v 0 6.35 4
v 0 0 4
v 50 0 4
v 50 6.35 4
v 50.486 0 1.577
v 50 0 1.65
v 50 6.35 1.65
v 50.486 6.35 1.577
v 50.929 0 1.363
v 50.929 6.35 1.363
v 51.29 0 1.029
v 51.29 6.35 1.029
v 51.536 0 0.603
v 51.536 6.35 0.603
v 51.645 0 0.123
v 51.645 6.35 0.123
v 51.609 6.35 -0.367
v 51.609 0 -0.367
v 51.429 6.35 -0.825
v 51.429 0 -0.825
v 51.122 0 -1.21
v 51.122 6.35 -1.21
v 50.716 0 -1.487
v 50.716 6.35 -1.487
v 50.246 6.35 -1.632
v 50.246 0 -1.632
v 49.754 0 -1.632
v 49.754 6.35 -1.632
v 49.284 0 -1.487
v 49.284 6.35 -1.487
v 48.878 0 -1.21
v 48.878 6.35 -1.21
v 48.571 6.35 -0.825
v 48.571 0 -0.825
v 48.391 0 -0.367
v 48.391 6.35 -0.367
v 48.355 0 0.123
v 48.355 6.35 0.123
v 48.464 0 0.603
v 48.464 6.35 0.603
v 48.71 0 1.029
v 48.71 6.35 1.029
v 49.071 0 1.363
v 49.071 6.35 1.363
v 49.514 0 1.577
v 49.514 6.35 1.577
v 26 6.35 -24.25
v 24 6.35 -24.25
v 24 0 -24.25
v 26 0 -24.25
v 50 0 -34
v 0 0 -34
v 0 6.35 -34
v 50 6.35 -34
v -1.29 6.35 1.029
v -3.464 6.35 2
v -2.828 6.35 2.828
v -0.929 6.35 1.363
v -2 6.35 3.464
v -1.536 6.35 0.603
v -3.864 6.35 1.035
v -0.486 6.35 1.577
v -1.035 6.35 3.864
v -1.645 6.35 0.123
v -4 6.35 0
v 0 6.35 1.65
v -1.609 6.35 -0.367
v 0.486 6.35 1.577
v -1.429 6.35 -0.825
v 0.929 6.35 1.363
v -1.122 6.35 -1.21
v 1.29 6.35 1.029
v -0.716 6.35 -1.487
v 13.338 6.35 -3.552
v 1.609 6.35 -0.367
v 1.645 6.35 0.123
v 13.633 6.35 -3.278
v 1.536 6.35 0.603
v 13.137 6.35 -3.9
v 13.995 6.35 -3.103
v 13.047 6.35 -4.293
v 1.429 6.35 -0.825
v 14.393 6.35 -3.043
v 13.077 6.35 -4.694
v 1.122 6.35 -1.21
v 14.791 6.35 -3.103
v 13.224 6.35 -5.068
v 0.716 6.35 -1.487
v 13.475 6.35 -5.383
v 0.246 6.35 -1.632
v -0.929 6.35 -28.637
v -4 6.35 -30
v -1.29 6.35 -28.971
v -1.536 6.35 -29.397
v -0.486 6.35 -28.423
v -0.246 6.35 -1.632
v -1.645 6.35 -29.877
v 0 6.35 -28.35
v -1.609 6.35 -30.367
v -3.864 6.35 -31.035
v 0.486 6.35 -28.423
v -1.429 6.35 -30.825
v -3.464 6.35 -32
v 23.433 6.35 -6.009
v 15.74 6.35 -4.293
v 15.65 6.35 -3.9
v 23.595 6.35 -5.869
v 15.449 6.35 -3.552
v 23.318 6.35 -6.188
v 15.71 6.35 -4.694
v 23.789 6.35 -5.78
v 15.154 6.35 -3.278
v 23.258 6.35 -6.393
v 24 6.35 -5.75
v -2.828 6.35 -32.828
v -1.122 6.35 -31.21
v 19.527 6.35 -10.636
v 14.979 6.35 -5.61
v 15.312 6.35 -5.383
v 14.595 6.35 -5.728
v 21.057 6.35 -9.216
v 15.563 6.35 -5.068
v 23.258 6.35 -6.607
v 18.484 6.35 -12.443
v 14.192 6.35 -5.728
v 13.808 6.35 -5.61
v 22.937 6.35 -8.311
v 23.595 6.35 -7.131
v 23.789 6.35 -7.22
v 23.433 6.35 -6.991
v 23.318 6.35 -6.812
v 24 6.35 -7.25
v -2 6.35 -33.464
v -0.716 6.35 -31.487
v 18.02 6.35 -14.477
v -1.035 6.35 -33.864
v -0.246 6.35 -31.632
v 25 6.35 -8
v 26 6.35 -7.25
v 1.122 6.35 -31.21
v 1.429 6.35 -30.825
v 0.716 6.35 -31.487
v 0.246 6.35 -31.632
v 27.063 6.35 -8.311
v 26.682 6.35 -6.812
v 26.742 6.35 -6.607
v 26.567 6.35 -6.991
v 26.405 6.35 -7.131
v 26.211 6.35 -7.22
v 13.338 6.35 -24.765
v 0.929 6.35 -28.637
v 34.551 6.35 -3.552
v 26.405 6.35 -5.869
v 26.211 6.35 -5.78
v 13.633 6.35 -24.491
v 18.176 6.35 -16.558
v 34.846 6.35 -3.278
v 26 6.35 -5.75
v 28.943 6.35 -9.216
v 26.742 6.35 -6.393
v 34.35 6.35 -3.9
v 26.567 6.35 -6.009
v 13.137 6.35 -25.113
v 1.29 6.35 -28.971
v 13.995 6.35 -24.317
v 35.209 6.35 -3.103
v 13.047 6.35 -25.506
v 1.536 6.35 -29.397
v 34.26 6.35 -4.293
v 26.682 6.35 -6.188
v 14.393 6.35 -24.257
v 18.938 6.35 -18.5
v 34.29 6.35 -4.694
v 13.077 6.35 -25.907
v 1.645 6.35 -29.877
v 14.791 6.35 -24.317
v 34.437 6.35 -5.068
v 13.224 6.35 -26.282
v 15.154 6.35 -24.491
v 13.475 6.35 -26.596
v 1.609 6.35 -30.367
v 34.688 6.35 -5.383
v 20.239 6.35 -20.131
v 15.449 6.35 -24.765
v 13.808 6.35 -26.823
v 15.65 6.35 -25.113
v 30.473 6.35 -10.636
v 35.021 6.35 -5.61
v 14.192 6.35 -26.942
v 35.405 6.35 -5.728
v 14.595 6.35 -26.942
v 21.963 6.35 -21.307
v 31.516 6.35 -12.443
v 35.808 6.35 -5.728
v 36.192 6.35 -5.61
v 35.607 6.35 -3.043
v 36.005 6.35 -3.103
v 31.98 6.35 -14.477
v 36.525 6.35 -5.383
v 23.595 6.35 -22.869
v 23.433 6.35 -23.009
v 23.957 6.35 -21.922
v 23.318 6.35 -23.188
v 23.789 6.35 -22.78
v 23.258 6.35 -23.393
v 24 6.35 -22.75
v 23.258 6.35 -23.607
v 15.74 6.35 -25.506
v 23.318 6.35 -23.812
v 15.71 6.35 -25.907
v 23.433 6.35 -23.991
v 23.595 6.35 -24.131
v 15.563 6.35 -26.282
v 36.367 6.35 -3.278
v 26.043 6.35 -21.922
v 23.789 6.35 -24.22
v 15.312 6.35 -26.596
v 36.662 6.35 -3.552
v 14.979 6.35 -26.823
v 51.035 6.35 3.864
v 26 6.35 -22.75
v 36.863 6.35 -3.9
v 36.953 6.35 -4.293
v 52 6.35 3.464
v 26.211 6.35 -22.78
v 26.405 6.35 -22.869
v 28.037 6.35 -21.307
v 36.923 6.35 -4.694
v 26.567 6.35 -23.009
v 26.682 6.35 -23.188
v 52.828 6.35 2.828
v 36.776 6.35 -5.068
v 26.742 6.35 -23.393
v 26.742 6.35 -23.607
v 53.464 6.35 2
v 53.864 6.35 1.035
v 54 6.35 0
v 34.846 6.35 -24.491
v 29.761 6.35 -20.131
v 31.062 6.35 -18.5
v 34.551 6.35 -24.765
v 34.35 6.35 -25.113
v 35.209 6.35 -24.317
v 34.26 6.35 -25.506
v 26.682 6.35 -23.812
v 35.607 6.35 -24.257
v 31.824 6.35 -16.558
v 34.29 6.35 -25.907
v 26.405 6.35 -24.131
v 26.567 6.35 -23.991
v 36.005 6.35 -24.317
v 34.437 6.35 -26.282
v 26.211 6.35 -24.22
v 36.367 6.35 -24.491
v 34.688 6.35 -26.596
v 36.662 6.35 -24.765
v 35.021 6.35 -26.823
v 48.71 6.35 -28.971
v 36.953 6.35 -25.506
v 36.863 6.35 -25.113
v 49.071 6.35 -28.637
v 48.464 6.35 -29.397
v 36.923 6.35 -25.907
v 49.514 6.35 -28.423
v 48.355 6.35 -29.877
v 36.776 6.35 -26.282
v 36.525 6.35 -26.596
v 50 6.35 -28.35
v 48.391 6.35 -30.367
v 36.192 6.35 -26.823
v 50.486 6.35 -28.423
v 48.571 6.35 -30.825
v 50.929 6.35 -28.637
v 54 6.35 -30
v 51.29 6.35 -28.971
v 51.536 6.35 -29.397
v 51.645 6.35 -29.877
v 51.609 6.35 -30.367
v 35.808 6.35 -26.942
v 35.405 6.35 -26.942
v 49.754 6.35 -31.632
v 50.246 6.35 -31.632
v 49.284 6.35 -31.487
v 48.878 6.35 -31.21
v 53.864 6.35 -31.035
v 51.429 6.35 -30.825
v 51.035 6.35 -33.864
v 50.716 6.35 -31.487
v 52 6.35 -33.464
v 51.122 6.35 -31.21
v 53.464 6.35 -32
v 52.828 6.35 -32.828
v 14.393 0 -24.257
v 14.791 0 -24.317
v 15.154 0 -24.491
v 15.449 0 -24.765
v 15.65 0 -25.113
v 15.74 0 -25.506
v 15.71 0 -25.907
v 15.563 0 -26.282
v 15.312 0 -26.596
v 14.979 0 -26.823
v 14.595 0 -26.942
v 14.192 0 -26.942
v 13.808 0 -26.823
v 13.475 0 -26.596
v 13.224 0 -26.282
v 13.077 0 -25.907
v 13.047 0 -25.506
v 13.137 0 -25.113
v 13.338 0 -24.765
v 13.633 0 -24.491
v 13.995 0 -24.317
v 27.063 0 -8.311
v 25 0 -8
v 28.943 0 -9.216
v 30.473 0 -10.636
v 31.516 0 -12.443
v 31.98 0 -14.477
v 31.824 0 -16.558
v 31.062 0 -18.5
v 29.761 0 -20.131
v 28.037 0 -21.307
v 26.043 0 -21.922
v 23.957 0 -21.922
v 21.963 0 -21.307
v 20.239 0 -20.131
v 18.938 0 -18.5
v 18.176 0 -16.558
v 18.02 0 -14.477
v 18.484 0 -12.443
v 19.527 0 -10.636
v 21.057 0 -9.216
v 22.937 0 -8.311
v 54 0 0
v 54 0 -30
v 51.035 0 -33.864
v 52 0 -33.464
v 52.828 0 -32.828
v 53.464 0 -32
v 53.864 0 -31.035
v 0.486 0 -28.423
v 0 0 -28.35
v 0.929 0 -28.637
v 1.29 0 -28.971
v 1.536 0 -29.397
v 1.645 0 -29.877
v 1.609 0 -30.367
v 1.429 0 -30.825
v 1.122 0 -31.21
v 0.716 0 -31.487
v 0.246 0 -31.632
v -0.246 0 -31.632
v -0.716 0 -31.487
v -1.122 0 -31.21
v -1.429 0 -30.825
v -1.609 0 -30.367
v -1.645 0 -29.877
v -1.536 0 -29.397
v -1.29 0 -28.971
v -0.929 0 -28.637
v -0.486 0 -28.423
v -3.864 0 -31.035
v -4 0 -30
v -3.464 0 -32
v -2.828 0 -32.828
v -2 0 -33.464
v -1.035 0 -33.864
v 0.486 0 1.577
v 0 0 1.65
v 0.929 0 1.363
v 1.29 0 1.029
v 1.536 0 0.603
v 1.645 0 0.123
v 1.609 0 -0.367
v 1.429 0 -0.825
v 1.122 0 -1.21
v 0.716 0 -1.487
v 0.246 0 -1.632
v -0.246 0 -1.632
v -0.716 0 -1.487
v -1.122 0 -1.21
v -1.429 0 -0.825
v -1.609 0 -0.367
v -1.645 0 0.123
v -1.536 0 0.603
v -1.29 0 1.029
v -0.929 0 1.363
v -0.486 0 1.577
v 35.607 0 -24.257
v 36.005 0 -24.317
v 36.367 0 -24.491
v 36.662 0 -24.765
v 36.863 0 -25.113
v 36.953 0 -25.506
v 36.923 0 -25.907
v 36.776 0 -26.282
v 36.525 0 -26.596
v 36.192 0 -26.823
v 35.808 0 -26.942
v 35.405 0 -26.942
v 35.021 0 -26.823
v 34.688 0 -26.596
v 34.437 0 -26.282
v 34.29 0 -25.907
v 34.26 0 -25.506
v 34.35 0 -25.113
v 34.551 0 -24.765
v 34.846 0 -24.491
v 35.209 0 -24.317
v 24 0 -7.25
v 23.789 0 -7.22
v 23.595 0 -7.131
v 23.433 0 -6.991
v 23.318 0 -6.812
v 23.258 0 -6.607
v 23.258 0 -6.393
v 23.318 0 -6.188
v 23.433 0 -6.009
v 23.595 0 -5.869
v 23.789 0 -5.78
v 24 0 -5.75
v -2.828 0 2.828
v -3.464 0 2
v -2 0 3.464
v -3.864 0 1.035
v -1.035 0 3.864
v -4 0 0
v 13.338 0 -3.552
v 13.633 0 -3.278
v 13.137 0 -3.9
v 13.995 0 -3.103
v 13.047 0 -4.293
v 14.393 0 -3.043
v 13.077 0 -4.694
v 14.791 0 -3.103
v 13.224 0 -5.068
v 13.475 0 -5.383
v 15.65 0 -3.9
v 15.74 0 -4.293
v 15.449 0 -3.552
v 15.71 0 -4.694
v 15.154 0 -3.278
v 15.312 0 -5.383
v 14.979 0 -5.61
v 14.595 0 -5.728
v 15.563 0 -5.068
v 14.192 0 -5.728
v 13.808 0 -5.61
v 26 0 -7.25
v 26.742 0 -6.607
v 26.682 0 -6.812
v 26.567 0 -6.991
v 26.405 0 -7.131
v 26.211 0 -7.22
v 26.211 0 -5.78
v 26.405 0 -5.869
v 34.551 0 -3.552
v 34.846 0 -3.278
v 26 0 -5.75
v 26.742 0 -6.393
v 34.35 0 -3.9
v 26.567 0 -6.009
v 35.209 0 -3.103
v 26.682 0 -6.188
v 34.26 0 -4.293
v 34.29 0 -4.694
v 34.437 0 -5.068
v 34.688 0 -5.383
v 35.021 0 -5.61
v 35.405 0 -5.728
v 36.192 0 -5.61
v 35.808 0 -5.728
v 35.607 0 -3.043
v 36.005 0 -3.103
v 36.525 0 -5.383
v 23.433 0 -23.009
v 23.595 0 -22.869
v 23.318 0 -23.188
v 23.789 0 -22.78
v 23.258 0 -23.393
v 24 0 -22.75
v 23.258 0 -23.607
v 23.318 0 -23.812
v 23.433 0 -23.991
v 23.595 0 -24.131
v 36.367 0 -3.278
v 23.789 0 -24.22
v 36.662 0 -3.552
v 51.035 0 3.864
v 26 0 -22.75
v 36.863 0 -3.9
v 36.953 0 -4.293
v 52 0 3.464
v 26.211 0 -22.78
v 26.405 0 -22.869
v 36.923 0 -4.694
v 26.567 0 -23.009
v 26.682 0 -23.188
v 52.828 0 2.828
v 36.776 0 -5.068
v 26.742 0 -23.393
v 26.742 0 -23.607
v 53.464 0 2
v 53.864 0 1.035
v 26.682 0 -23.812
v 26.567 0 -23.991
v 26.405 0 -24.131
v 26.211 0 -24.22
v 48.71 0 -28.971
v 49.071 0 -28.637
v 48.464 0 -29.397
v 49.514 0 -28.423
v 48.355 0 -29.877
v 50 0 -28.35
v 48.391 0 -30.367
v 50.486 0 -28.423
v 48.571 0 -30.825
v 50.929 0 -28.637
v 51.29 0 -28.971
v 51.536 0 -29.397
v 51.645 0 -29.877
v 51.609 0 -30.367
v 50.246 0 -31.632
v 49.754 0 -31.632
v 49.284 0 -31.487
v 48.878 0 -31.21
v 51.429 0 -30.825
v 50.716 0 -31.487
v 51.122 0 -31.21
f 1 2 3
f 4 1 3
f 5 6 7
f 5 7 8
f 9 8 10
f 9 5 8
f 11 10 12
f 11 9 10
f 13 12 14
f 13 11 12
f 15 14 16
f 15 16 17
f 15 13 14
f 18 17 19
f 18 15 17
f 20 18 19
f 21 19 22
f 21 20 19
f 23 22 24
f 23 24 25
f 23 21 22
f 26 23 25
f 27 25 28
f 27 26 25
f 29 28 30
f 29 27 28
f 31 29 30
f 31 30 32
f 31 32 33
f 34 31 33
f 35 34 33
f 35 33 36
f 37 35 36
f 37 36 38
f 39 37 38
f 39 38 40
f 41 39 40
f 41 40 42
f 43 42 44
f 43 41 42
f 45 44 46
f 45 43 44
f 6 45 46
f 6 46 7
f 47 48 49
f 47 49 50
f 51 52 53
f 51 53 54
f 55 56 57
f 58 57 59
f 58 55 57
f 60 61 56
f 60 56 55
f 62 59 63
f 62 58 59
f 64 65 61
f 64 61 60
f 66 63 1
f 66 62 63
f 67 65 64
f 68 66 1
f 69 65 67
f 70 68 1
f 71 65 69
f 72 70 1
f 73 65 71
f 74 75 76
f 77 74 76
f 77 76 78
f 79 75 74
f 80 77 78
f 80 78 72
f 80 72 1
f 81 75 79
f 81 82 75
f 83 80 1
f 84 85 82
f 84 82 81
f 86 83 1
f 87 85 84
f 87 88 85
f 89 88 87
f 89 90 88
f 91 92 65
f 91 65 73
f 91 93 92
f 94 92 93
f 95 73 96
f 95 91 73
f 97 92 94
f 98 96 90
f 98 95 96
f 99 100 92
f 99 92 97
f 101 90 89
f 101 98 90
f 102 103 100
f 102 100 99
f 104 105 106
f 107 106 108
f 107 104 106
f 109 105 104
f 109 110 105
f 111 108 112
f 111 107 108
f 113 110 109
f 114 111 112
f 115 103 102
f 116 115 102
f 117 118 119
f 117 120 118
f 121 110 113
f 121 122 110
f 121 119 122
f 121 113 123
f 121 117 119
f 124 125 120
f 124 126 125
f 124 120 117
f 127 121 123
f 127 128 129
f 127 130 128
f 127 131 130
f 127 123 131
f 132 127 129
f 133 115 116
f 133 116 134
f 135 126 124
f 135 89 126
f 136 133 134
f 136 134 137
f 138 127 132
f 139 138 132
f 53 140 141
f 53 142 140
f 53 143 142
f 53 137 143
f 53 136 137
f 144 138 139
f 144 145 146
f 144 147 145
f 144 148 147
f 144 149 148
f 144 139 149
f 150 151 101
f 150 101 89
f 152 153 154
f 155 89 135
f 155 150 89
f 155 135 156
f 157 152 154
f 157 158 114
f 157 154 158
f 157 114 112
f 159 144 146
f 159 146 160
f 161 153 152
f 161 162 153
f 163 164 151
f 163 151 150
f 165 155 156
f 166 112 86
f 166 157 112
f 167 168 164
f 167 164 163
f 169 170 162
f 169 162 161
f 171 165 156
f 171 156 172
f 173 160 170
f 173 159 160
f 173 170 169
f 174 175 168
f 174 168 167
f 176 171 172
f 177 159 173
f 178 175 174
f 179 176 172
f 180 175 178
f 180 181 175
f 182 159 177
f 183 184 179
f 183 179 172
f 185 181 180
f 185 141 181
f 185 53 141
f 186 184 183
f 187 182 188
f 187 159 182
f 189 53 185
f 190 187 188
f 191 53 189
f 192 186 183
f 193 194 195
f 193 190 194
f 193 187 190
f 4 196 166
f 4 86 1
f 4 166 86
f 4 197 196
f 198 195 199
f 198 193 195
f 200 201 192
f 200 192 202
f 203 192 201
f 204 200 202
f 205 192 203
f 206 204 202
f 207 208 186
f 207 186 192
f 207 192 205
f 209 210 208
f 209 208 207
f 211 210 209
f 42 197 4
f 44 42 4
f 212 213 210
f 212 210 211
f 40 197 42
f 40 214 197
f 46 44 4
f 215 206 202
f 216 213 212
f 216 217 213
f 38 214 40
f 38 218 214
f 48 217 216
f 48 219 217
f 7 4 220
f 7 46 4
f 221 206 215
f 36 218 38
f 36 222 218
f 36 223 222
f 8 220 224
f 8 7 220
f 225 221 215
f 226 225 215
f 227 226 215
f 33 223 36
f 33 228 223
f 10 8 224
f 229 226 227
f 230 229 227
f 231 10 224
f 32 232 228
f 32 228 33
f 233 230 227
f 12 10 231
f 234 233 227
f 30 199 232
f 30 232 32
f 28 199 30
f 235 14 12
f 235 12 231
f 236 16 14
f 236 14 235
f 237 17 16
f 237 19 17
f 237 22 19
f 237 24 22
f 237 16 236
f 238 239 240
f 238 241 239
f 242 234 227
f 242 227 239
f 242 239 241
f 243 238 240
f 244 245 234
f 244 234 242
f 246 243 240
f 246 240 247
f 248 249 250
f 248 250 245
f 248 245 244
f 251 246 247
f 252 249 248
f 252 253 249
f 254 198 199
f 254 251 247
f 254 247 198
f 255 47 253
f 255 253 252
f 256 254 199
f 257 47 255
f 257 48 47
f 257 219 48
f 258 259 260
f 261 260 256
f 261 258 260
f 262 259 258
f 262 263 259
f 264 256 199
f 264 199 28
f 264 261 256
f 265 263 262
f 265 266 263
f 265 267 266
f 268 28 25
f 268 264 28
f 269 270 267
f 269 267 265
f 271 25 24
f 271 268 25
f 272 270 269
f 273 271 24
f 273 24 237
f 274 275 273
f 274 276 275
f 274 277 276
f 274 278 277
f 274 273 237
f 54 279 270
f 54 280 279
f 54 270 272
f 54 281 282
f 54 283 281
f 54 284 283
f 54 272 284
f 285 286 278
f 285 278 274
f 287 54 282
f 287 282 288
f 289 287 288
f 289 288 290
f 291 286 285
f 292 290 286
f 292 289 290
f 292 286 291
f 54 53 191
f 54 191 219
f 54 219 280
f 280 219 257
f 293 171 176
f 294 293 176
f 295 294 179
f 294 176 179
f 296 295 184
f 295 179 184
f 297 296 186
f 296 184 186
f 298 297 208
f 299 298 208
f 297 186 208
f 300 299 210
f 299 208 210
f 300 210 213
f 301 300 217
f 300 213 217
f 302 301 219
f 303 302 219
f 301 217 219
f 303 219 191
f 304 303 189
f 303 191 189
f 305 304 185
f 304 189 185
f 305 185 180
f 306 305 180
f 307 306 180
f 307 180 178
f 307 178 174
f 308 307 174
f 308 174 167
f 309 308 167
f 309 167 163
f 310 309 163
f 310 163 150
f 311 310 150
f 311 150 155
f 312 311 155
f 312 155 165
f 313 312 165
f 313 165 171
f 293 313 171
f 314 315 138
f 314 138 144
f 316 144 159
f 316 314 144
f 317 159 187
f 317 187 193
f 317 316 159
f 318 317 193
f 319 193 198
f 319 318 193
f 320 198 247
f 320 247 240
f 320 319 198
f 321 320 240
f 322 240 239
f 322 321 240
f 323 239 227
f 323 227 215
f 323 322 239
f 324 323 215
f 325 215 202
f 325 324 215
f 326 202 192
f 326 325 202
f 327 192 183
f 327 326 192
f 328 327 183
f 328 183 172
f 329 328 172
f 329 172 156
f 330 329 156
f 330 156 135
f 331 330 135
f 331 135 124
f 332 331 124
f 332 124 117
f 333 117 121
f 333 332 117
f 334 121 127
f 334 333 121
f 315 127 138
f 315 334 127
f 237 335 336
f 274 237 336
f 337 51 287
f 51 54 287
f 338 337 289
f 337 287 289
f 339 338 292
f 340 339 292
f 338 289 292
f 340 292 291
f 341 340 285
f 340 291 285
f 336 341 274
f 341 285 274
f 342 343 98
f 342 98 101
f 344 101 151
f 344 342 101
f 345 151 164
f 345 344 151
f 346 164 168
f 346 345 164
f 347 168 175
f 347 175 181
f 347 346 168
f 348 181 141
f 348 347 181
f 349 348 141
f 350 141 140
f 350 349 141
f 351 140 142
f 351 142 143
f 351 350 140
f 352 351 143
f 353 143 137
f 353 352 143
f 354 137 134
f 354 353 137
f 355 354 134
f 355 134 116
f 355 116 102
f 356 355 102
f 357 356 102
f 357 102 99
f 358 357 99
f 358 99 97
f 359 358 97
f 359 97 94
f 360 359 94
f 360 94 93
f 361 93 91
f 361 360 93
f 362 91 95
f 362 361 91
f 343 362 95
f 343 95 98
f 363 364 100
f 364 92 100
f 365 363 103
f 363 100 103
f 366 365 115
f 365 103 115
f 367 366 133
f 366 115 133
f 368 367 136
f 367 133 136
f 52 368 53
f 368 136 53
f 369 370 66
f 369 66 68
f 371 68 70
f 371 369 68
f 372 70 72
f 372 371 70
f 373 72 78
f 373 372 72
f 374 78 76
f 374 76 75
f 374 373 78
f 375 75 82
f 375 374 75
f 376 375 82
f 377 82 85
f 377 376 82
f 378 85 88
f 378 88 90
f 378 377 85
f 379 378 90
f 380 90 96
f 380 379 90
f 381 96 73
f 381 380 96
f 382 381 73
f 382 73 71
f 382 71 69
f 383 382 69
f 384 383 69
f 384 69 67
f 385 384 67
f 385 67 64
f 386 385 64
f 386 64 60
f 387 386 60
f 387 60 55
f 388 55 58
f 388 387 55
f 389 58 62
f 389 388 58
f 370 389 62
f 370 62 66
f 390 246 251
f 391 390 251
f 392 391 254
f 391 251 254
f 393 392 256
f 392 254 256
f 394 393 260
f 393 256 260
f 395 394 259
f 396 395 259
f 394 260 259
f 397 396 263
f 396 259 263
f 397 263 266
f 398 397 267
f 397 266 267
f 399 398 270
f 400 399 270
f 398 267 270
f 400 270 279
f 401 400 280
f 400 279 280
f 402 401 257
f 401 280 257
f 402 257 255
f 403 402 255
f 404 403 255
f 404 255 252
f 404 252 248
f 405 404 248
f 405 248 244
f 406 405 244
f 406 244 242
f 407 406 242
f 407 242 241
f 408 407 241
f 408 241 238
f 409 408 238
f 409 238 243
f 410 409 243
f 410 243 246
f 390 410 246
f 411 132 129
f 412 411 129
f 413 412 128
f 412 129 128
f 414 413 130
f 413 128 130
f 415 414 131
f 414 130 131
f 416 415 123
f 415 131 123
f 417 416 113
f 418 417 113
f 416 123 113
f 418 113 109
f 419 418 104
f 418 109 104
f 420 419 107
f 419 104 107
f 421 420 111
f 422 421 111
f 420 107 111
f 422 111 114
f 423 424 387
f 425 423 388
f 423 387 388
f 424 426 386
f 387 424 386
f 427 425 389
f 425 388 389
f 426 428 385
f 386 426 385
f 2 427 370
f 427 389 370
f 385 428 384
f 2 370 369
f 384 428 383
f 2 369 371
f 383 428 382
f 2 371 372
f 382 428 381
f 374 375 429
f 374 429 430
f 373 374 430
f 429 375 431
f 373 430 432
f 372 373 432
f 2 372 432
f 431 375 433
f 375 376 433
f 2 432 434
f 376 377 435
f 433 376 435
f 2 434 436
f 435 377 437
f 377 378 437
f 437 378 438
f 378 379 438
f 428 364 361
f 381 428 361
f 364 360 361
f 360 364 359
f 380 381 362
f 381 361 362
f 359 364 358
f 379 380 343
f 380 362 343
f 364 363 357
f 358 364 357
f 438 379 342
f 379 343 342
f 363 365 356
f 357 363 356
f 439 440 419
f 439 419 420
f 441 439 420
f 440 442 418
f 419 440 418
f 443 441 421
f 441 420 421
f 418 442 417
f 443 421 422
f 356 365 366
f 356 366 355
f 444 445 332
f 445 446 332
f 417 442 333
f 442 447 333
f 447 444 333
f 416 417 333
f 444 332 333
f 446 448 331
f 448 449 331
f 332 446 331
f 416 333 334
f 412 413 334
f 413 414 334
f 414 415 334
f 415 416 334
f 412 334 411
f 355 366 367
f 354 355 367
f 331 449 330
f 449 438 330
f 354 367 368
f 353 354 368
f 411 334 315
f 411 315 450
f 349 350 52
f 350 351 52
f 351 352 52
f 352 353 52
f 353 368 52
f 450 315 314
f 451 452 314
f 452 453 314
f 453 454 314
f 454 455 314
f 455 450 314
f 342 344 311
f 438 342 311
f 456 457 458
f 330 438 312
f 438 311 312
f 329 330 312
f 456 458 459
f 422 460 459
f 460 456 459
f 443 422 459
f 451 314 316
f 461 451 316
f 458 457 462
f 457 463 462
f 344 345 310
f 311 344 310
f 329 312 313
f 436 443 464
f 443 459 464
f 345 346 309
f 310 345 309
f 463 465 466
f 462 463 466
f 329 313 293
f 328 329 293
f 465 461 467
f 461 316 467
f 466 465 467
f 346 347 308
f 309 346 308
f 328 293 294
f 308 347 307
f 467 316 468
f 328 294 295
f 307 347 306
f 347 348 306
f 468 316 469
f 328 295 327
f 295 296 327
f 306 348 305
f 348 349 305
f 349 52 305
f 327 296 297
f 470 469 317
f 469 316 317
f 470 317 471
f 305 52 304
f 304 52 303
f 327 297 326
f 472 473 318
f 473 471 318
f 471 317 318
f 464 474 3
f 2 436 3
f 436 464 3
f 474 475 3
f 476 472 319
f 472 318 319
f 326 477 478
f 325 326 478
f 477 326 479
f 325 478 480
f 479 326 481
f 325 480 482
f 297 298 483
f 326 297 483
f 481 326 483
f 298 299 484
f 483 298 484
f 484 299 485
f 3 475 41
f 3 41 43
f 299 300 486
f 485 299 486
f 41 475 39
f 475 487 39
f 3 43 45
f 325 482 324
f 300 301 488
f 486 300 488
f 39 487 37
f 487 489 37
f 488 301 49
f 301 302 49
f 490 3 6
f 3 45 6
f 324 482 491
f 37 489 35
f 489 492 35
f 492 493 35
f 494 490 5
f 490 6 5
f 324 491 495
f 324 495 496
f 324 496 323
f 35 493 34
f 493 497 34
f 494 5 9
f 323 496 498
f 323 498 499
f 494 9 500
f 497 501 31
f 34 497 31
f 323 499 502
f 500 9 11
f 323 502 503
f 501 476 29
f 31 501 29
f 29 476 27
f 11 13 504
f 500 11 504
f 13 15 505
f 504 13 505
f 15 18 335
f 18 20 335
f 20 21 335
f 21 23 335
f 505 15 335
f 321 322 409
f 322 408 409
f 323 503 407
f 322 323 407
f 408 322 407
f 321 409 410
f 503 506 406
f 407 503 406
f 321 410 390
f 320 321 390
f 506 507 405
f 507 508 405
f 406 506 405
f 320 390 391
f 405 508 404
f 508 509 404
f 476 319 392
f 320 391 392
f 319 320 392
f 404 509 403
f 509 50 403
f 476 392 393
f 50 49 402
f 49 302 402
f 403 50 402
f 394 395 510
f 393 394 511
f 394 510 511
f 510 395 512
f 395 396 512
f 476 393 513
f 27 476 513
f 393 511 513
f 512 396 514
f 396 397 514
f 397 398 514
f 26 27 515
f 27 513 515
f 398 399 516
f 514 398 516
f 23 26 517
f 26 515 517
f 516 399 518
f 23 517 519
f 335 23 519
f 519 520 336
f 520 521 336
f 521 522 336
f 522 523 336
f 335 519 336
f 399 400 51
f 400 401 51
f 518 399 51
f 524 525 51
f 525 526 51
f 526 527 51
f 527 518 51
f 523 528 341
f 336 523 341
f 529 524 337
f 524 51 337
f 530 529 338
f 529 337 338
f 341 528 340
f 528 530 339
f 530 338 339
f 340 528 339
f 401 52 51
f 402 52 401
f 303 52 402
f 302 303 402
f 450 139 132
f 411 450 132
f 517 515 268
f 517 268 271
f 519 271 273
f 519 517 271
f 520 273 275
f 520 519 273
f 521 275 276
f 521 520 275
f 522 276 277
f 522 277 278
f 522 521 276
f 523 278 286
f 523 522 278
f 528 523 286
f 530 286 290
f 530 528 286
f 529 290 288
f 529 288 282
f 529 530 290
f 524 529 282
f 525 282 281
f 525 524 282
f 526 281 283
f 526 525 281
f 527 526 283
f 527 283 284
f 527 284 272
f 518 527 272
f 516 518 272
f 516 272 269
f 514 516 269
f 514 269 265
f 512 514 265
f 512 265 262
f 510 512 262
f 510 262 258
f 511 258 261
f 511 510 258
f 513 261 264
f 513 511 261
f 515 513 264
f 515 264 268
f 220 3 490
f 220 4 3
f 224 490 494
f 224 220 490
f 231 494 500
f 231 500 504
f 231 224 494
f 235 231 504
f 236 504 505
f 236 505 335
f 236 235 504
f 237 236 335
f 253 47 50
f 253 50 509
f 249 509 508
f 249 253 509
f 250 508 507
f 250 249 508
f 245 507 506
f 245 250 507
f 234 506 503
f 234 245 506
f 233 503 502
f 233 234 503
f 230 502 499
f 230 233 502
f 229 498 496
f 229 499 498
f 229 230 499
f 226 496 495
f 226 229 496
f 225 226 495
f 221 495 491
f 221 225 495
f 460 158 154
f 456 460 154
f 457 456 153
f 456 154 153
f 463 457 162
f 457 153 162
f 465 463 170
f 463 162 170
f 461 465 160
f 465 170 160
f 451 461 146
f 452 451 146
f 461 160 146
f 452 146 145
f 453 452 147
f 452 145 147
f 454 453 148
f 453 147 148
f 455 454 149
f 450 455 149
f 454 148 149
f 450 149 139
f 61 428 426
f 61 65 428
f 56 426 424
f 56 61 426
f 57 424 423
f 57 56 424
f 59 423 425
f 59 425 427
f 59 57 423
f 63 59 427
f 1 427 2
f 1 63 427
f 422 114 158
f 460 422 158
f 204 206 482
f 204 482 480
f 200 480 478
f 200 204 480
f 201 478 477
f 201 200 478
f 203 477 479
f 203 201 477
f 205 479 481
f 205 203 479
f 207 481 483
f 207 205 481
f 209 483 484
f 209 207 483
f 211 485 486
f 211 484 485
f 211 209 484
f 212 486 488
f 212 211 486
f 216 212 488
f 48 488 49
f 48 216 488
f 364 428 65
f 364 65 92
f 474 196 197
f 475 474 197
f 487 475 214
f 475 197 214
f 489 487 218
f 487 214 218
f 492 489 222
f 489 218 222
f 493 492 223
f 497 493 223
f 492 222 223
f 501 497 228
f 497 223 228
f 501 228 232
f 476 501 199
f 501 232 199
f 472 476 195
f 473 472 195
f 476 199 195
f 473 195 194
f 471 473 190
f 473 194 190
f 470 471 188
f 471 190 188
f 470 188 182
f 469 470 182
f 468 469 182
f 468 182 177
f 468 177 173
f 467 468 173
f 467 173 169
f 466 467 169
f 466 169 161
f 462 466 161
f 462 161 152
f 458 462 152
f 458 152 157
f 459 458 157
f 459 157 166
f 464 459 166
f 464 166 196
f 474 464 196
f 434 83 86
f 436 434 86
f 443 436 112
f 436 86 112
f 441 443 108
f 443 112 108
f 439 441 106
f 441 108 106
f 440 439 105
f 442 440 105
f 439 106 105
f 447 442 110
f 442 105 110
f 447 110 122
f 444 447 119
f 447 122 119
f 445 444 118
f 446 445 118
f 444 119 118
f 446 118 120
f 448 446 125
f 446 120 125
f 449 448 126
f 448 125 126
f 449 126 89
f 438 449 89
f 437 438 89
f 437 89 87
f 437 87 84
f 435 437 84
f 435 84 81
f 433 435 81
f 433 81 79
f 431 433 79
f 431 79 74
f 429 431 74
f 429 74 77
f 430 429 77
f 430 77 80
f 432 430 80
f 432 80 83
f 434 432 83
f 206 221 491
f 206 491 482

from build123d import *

# Parameters (mm, degrees)
SKETCH1_W           = 58
SKETCH1_H           = 38
SKETCH1_R           = 7
SKETCH1_R_2         = 1.65
BOSS_EXTRUDE1_DEPTH = 6.35
FILLET1_R           = 4
CUT_EXTRUDE1_DEPTH  = 65.127392743
SKETCH3_R           = 1.35
CUT_EXTRUDE2_DEPTH  = 65.127392743


with BuildPart() as part:
    # Sketch1 → Boss-Extrude1 (new body)
    with BuildSketch(Plane(origin=(0, 0, 0), x_dir=(1, 0, 0), z_dir=(0, 1, 0))):
        with Locations((25, 15)):
            Rectangle(SKETCH1_W, SKETCH1_H)
        with Locations(Location((25, 15, 0), (0, 0, 270))):
            Circle(SKETCH1_R, mode=Mode.SUBTRACT)
        with Locations(Location((0, 30, 0), (0, 0, 270))):
            Circle(SKETCH1_R_2, mode=Mode.SUBTRACT)
        with Locations(Location((50, 30, 0), (0, 0, 270))):
            Circle(SKETCH1_R_2, mode=Mode.SUBTRACT)
        with Locations(Location((50, 0, 0), (0, 0, 270))):
            Circle(SKETCH1_R_2, mode=Mode.SUBTRACT)
        with Locations(Location((0, 0, 0), (0, 0, 270))):
            Circle(SKETCH1_R_2, mode=Mode.SUBTRACT)
    extrude(amount=BOSS_EXTRUDE1_DEPTH)

    # Fillet1
    fillet1_edges = [part.edges().sort_by_distance(p)[0] for p in [
        (-4, 3.175, -34),
        (54, 3.175, -34),
        (54, 3.175, 4),
        (-4, 3.175, 4),
    ]]
    fillet(fillet1_edges, radius=FILLET1_R)

    # Sketch2 → Cut-Extrude1 (cut, through all)
    with BuildSketch(Plane(origin=(0, 6.35, 0), x_dir=(1, 0, 0), z_dir=(0, 1, 0))):
        with BuildLine():
            Line((24, 24.250000018), (26, 24.250000018))
            ThreePointArc((26, 24.250000018), (26.75, 23.500000018), (26, 22.750000018))
            Line((26, 22.750000018), (24, 22.750000018))
            ThreePointArc((24, 22.750000018), (23.25, 23.500000018), (24, 24.250000018))
        make_face()
        with BuildLine():
            Line((24, 5.749999982), (26, 5.749999982))
            ThreePointArc((26, 5.749999982), (26.75, 6.499999982), (26, 7.249999982))
            Line((26, 7.249999982), (24, 7.249999982))
            ThreePointArc((24, 7.249999982), (23.25, 6.499999982), (24, 5.749999982))
        make_face()
    extrude(amount=-CUT_EXTRUDE1_DEPTH, mode=Mode.SUBTRACT)

    # Sketch3 → Cut-Extrude2 (cut, through all)
    with BuildSketch(Plane(origin=(0, 6.35, 0), x_dir=(1, 0, 0), z_dir=(0, 1, 0))):
        with Locations(Location((35.606601718, 25.606601718, 0), (0, 0, 270))):
            Circle(SKETCH3_R)
        with Locations(Location((35.606601718, 4.393398282, 0), (0, 0, 270))):
            Circle(SKETCH3_R)
        with Locations(Location((14.393398282, 25.606601718, 0), (0, 0, 270))):
            Circle(SKETCH3_R)
        with Locations(Location((14.393398282, 4.393398282, 0), (0, 0, 270))):
            Circle(SKETCH3_R)
    extrude(amount=-CUT_EXTRUDE2_DEPTH, mode=Mode.SUBTRACT)


solid = part.part
